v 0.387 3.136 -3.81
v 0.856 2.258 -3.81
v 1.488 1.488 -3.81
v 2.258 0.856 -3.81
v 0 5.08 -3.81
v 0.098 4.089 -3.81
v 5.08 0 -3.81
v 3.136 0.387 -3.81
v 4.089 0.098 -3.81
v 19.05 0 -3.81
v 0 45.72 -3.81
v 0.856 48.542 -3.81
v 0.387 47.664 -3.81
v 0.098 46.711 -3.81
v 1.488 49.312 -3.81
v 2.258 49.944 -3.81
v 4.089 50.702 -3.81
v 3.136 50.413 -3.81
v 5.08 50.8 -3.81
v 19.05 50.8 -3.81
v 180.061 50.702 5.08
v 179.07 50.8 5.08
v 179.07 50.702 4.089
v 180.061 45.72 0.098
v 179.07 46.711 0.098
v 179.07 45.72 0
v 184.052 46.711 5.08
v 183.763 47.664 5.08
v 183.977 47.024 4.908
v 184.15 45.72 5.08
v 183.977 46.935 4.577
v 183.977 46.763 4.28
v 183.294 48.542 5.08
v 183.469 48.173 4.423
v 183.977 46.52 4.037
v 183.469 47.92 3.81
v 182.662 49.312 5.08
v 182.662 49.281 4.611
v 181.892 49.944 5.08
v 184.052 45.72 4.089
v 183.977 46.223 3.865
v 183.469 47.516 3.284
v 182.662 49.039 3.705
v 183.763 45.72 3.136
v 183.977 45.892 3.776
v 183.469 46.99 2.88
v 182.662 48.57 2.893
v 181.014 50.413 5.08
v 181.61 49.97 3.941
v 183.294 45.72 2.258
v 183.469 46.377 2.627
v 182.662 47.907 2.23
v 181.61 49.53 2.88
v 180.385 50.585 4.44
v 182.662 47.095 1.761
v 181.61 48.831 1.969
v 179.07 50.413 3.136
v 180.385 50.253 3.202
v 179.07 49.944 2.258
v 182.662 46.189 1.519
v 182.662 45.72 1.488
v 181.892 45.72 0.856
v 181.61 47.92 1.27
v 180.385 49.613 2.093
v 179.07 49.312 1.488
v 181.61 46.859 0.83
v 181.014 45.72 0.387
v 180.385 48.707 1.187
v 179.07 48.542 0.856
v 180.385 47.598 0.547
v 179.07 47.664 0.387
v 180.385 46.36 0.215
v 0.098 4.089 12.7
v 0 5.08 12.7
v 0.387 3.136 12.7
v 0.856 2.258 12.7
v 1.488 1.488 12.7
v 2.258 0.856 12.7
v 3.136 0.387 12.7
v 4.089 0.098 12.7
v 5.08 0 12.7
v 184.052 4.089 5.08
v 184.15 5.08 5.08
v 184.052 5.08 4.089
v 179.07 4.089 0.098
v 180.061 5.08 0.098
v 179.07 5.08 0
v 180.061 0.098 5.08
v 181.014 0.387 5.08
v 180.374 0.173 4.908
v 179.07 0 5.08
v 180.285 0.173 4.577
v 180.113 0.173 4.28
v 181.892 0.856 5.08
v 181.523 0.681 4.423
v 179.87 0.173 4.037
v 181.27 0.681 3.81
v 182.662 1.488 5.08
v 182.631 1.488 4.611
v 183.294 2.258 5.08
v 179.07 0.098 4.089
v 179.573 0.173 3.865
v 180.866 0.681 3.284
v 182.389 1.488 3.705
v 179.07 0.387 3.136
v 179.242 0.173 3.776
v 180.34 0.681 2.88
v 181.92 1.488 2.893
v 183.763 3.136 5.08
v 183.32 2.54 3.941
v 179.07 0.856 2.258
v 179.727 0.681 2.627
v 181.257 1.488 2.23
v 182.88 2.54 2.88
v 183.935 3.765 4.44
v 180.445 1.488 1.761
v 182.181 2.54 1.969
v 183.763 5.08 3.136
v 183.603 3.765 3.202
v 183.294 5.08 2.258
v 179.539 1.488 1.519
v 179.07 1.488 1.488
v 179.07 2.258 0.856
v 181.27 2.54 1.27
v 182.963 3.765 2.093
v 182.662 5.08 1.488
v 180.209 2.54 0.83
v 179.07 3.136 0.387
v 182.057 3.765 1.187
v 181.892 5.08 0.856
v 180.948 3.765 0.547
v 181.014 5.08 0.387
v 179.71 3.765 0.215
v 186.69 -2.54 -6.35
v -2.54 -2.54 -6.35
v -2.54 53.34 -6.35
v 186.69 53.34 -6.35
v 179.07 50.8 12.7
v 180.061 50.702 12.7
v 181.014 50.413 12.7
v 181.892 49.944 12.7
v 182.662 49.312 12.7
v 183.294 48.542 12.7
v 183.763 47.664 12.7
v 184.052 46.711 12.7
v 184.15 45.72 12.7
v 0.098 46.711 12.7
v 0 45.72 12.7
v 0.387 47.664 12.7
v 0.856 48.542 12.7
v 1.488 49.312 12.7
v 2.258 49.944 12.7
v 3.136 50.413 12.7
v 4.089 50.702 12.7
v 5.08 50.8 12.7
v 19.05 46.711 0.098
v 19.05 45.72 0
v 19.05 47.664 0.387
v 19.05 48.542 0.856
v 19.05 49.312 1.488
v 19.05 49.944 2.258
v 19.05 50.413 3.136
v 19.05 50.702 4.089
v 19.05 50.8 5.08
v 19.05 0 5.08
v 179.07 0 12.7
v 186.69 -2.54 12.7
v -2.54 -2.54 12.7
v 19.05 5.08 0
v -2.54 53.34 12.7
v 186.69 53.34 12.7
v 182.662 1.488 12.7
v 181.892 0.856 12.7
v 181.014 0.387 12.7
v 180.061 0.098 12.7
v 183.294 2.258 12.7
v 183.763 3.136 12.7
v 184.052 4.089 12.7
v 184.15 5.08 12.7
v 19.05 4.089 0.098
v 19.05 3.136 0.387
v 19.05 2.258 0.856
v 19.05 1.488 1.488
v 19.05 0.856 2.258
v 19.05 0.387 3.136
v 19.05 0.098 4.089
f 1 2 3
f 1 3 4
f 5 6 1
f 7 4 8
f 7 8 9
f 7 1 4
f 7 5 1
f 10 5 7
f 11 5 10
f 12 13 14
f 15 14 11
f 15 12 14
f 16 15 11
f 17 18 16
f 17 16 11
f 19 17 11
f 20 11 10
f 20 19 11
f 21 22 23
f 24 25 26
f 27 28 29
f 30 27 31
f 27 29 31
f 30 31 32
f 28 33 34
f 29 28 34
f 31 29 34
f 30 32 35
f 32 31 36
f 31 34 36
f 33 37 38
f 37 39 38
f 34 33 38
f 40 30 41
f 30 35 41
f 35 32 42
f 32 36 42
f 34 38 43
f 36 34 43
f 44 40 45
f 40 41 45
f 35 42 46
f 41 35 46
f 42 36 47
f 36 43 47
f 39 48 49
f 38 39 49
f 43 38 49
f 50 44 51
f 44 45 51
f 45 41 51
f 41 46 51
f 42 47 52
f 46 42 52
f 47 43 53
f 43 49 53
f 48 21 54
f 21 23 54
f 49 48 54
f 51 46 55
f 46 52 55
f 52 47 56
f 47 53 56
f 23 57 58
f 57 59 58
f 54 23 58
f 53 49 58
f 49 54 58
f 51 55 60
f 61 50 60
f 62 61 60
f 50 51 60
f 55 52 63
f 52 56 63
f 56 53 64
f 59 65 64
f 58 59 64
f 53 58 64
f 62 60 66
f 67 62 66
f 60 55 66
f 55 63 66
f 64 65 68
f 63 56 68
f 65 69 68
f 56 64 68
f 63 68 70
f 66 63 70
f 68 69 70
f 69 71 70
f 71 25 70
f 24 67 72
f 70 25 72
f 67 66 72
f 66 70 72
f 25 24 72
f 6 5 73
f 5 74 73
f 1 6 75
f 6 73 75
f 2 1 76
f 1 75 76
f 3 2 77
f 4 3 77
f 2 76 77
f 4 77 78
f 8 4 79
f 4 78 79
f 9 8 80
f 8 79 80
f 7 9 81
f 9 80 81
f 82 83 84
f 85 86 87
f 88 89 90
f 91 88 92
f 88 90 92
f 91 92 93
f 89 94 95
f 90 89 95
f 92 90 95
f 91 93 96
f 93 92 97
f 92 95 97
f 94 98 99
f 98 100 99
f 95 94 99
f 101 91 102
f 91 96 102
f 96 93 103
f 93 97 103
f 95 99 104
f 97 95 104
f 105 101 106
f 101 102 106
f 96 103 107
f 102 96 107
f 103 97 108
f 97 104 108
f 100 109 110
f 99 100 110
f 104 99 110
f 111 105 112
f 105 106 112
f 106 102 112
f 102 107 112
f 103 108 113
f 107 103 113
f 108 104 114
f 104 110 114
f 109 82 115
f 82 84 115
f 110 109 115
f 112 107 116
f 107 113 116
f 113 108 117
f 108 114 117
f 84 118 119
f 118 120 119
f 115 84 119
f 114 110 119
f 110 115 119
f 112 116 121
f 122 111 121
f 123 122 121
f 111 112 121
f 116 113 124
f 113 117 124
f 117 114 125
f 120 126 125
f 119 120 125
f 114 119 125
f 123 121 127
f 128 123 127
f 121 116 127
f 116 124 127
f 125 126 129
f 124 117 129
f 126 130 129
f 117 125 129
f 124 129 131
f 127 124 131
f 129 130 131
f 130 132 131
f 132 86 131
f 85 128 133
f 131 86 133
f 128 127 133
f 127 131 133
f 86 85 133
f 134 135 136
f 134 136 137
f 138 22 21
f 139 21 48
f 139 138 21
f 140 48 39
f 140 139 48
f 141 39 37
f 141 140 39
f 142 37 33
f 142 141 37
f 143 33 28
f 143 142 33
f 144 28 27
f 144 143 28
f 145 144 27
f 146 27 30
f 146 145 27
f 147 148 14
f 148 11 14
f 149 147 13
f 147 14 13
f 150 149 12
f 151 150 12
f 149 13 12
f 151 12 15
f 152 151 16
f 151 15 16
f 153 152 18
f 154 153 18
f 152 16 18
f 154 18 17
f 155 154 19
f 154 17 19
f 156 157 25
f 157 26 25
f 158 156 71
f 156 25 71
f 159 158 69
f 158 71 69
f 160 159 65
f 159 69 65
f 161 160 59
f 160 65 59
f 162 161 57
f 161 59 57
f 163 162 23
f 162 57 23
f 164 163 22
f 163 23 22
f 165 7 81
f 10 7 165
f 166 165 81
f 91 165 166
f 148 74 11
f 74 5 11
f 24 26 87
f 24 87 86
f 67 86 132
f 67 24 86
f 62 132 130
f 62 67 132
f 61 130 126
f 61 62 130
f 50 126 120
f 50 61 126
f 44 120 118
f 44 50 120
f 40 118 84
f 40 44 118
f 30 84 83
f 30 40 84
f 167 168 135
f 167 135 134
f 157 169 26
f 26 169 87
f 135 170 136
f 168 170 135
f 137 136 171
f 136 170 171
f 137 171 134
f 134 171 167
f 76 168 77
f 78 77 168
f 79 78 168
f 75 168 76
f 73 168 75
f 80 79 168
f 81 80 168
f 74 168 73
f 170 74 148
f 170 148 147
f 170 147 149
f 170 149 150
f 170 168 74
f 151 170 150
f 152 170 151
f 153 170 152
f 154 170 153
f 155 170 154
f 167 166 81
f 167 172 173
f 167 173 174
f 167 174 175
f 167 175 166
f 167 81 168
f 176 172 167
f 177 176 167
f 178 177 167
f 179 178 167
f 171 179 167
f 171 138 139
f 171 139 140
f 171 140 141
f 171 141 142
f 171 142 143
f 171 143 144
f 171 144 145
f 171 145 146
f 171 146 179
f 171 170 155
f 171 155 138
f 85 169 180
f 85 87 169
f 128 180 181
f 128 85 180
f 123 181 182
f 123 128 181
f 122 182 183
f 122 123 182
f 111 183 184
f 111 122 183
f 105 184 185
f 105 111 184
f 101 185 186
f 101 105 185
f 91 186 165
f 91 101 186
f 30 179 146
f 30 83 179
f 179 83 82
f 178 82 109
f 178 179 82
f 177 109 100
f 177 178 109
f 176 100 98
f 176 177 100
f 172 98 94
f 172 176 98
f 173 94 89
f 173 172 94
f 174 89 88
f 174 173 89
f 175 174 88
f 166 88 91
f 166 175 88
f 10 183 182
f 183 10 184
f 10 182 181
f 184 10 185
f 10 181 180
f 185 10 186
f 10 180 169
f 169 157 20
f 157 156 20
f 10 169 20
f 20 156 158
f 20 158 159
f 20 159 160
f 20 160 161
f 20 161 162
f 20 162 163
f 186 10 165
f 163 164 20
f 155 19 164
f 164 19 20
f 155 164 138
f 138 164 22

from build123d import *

# Parameters (mm, degrees)
F0_W     = 189.23
F0_H     = 55.88
F0_W_2   = 184.15
F0_H_2   = 50.8
F1_DEPTH = 12.7
F2_W     = 189.23
F2_H     = 55.88
F3_DEPTH = 6.35
F4_W     = 19.05
F4_H     = 50.8
F5_DEPTH = 3.81
F6_R     = 5.08


with BuildPart() as f1:
    # F0 (on Top) → F1 (new body)
    with BuildSketch(Plane.XY):
        with Locations((92.075, 25.4)):
            Rectangle(F0_W, F0_H)
        with Locations((92.075, 25.4)):
            Rectangle(F0_W_2, F0_H_2, mode=Mode.SUBTRACT)
    extrude(amount=F1_DEPTH)

    # F2 (on face) → F3 (join)
    with BuildSketch(Plane(origin=(0, 0, 0), x_dir=(1, 0, 0), z_dir=(0, 0, -1))):
        with Locations((92.075, -25.4)):
            Rectangle(F2_W, F2_H)
    extrude(amount=F3_DEPTH)

    # F4 (on face) → F5 (cut)
    with BuildSketch(Plane.XY):
        with Locations((9.525, 25.4)):
            Rectangle(F4_W, F4_H)
    extrude(amount=-F5_DEPTH, mode=Mode.SUBTRACT)

    # F6
    f6_edges = [f1.edges().sort_by_distance(p)[0] for p in [
        (101.6, 50.8, 0),
        (0, 50.8, 4.445),
        (184.15, 50.8, 6.35),
        (184.15, 25.4, 0),
        (184.15, 0, 6.35),
        (101.6, 0, 0),
        (0, 0, 4.445),
    ]]
    fillet(f6_edges, radius=F6_R)


solid = f1.part
